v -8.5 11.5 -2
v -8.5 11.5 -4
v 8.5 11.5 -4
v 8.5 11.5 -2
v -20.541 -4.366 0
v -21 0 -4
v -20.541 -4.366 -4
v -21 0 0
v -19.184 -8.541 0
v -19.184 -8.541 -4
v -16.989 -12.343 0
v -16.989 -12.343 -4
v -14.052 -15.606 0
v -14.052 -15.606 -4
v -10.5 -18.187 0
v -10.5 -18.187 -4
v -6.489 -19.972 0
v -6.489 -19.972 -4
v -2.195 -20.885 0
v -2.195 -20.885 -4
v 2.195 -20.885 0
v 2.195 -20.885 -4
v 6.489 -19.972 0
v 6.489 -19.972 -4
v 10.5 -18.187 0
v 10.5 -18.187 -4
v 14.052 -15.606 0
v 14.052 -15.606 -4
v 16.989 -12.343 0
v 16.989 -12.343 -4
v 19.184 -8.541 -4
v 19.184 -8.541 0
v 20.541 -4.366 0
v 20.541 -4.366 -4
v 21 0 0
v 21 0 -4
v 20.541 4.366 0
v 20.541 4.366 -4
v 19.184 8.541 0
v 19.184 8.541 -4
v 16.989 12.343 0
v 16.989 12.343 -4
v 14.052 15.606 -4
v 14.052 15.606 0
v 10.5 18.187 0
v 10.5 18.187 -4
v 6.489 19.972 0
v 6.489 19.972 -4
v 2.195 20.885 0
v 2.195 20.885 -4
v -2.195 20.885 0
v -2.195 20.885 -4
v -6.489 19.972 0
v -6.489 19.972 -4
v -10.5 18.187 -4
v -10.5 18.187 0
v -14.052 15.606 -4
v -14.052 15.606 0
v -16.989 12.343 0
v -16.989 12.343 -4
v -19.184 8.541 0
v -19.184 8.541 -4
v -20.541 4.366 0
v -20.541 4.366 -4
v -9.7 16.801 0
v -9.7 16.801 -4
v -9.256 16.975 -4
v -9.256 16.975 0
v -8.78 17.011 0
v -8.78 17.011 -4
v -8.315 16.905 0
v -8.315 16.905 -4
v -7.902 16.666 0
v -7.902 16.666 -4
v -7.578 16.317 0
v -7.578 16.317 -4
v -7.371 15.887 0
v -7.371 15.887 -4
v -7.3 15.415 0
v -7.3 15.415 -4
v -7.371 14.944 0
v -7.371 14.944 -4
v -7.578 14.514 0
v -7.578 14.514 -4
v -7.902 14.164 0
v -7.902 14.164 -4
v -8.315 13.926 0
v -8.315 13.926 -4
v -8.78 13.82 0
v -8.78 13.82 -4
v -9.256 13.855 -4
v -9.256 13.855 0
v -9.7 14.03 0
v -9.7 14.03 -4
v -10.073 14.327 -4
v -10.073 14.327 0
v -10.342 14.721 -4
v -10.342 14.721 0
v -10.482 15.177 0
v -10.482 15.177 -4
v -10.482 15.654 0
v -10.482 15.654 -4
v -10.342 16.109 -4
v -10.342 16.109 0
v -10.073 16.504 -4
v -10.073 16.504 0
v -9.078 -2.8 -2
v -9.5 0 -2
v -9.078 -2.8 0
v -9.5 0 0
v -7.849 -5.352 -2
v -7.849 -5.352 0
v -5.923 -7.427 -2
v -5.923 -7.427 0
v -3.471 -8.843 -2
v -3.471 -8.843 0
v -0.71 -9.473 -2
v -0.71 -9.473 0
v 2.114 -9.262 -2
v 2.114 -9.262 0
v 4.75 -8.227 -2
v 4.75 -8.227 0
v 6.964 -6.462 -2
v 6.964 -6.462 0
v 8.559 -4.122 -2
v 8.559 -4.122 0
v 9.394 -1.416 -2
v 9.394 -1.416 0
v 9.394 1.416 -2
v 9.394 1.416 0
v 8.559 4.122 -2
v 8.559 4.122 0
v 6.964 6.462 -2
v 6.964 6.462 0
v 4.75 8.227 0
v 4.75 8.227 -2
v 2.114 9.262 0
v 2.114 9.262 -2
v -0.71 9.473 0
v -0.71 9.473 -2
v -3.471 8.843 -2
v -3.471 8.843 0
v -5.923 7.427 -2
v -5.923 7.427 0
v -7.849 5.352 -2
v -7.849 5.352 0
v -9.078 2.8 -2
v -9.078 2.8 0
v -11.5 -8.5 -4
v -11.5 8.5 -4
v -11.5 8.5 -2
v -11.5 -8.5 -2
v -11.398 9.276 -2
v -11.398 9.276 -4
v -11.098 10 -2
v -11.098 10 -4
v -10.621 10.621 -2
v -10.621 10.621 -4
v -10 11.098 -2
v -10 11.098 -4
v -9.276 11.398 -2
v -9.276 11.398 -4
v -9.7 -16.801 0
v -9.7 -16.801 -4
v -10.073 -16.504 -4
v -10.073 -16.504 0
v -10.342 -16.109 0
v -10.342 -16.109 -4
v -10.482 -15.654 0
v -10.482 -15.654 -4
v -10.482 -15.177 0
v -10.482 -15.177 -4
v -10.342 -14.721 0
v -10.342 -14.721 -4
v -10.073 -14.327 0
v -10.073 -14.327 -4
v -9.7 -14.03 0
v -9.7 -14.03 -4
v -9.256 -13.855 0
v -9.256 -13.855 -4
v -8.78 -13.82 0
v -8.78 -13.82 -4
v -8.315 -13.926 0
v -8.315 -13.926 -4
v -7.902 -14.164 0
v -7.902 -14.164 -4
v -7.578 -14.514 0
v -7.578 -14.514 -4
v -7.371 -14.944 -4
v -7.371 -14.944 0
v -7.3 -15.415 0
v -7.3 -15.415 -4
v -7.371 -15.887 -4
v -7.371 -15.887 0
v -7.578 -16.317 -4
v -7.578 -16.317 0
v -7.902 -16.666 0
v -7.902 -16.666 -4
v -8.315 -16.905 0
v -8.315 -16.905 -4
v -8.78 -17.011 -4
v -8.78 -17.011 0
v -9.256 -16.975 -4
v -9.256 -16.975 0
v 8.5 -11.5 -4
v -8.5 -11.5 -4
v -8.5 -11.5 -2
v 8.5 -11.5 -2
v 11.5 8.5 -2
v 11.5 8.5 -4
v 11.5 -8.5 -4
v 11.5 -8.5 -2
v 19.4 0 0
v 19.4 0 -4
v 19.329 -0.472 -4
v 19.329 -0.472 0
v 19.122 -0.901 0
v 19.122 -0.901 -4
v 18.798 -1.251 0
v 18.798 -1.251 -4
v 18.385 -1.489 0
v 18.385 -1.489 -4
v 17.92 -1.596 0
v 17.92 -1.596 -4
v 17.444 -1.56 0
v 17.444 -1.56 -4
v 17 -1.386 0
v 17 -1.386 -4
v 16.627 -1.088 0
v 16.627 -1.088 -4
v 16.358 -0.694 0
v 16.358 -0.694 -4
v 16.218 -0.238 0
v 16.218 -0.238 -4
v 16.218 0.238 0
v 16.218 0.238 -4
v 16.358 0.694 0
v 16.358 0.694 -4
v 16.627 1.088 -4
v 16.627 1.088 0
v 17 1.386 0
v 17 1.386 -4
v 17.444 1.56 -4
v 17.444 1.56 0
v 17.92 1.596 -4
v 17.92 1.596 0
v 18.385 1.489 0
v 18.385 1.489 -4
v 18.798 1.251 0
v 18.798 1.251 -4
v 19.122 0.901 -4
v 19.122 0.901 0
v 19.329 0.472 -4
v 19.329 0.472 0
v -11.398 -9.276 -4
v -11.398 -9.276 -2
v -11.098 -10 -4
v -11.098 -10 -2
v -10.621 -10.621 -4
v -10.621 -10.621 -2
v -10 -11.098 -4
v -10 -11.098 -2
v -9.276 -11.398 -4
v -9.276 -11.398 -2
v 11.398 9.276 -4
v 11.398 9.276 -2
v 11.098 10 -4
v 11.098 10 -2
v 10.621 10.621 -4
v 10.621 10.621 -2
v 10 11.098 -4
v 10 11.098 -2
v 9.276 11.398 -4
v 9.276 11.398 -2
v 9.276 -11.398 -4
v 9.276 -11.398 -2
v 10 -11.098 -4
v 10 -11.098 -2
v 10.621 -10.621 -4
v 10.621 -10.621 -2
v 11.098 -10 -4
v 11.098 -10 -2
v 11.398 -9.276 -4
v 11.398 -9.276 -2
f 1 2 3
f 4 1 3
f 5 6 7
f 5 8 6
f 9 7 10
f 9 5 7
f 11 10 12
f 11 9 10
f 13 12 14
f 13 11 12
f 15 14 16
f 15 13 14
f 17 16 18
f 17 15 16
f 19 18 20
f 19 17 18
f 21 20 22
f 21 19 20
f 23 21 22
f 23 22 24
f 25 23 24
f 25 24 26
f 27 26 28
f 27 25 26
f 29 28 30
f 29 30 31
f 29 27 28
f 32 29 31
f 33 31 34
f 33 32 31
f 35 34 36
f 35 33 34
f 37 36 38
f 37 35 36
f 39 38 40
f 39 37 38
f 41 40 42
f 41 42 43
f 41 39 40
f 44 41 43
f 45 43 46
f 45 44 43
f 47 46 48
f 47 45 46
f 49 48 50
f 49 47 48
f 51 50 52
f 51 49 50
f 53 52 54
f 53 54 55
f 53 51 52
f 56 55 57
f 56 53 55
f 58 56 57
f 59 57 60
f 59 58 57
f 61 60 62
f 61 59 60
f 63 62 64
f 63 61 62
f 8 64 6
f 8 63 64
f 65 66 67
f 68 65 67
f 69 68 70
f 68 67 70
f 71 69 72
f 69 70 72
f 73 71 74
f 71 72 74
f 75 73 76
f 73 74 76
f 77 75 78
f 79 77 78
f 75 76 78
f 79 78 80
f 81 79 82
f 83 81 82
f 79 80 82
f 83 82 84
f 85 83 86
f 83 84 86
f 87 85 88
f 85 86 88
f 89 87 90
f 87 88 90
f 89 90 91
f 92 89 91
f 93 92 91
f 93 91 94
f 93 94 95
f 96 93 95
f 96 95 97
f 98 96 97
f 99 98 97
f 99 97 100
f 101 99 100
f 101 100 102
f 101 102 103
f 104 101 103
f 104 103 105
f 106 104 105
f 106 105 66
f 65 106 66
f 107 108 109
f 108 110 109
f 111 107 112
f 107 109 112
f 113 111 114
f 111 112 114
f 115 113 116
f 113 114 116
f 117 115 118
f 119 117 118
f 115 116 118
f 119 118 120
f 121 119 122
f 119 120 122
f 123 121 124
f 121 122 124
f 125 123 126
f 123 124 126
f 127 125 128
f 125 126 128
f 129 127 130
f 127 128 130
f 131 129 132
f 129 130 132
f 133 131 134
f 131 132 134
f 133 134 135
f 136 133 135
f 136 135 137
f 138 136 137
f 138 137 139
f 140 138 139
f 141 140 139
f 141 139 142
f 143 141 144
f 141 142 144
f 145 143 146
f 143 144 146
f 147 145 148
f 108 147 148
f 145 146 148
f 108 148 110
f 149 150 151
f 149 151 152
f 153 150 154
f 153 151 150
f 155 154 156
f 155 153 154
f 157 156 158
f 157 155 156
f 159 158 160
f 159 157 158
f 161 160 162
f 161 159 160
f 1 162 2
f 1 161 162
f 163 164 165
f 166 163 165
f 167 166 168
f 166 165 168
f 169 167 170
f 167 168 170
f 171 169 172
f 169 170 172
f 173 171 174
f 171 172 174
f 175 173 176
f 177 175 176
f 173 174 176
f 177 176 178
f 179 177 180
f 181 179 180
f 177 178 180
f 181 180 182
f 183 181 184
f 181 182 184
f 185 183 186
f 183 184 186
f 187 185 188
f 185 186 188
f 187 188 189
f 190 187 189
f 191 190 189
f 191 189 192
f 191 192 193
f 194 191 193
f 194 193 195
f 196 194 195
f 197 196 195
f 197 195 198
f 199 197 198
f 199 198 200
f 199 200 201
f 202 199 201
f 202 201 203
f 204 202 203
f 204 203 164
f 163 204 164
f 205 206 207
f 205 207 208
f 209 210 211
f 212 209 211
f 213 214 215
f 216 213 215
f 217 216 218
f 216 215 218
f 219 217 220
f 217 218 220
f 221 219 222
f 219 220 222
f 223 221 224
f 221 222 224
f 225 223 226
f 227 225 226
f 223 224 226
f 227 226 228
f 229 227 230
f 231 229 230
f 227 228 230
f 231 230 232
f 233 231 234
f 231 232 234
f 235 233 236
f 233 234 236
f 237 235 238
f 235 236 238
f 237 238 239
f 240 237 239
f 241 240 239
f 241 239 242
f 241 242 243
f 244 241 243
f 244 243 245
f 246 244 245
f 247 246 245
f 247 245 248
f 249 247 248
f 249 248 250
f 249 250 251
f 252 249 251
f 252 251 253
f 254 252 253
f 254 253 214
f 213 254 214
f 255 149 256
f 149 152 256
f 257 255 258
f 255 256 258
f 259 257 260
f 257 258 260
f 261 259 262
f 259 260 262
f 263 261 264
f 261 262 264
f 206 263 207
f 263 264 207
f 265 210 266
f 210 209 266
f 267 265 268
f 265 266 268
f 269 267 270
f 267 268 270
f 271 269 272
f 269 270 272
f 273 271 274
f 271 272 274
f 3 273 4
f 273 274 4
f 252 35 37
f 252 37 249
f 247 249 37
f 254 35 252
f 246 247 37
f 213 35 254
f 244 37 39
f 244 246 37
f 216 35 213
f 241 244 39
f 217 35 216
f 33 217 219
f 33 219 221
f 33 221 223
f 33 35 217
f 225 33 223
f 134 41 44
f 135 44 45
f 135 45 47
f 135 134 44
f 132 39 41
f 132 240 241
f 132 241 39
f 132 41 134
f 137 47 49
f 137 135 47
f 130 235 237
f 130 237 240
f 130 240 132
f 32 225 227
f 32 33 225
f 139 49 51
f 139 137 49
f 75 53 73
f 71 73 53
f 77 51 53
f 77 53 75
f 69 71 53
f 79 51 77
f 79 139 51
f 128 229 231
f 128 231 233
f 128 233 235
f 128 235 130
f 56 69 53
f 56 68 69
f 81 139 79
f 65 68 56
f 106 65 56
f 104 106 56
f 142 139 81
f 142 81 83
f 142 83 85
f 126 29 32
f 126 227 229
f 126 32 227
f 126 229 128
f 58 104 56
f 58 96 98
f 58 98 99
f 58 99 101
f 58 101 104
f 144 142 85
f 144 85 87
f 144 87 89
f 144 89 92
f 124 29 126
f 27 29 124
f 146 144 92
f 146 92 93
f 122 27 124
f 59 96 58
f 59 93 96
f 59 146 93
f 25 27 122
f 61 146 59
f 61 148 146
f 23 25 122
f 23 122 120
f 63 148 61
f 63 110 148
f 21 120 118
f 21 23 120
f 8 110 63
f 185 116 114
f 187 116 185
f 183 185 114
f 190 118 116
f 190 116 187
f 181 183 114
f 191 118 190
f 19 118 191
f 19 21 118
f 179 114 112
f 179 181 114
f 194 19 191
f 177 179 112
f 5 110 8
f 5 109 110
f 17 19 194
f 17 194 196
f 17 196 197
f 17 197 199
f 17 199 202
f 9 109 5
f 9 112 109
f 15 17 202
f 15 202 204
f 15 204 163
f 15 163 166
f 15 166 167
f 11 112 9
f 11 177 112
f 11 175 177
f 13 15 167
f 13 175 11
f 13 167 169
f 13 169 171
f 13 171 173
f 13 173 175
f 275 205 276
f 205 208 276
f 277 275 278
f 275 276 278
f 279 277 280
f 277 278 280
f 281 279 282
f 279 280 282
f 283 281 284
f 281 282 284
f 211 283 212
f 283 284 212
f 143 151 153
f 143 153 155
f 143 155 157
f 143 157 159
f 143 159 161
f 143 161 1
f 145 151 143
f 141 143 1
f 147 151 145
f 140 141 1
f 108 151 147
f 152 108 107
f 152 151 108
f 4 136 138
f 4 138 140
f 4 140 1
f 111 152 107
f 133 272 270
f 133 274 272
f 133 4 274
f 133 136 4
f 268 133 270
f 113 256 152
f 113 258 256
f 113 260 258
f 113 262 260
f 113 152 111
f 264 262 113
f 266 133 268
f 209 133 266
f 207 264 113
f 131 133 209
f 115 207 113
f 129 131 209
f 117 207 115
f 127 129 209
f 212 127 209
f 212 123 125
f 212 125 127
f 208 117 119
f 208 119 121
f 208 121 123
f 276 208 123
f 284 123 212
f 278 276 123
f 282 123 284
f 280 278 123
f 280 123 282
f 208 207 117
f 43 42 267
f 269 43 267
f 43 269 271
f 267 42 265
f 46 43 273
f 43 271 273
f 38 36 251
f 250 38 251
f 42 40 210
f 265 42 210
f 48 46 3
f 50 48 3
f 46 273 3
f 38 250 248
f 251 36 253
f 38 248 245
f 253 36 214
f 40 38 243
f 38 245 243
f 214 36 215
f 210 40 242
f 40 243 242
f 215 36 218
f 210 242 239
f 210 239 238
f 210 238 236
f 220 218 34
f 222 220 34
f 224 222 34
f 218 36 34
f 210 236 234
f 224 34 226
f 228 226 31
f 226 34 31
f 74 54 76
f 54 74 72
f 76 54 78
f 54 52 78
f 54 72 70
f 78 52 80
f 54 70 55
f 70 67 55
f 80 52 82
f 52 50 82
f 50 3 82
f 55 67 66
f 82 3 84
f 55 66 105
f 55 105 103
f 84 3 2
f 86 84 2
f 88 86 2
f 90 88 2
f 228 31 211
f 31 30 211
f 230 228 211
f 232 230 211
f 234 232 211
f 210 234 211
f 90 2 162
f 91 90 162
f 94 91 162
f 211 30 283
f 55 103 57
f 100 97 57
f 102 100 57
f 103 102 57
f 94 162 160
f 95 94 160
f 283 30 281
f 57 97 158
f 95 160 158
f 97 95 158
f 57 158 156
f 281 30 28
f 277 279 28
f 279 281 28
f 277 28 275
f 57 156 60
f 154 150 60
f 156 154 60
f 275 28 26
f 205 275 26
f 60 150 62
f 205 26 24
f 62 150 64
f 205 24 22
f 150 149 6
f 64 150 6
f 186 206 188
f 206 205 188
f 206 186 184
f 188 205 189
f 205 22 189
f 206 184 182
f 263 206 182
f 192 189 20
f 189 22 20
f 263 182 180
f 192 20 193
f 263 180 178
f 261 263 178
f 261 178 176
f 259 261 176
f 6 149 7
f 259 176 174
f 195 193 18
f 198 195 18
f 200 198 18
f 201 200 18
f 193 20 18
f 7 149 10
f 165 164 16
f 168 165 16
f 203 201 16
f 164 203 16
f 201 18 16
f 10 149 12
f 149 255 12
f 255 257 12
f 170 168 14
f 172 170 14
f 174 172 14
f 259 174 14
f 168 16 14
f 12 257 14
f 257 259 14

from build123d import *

# Parameters (mm, degrees)
SKETCH001_W           = 11.5
SKETCH001_H           = 4
SKETCH002_W           = 23
SKETCH002_H           = 23
POCKET_DEPTH          = 2
FILLET_R              = 3
SKETCH008_R           = 1.6
POCKET004_DEPTH       = 123.064009
POLARPATTERN001_COUNT = 3


with BuildPart() as part:
    # Sketch001 → Revolution001 (revolve)
    with BuildSketch(Plane.XZ):
        with Locations((-15.25, -2)):
            Rectangle(SKETCH001_W, SKETCH001_H)
    revolve(axis=Axis((0, 0, 0), (0, 0, 1)))

    # Sketch002 (on Face3 of Revolution001) → Pocket (cut)
    with BuildSketch(Plane(origin=(0, 0, -4), x_dir=(1, 0, 0), z_dir=(0, 0, -1))):
        Rectangle(SKETCH002_W, SKETCH002_H)
    extrude(amount=-POCKET_DEPTH, mode=Mode.SUBTRACT)

    # Fillet
    fillet_edges = [part.edges().sort_by_distance(p)[0] for p in [
        (-11.5, 11.5, -3),
        (11.5, 11.5, -3),
        (11.5, -11.5, -3),
        (-11.5, -11.5, -3),
    ]]
    fillet(fillet_edges, radius=FILLET_R)

    # Sketch008 → Pocket004 (cut, through all)
    with BuildSketch(Plane(origin=(0, 0, -4), x_dir=(1, 0, 0), z_dir=(0, 0, -1))):
        with Locations((17.8, 0)):
            Circle(SKETCH008_R)
    pocket004 = extrude(amount=-POCKET004_DEPTH, mode=Mode.SUBTRACT)

    # PolarPattern001: Pocket004 ×3 about axis
    polarpattern001_axis = Axis((0, 0, -4), (0, 0, -1))
    for i in range(1, POLARPATTERN001_COUNT):
        add(pocket004.rotate(polarpattern001_axis, i * 360 / POLARPATTERN001_COUNT), mode=Mode.SUBTRACT)


solid = part.part
